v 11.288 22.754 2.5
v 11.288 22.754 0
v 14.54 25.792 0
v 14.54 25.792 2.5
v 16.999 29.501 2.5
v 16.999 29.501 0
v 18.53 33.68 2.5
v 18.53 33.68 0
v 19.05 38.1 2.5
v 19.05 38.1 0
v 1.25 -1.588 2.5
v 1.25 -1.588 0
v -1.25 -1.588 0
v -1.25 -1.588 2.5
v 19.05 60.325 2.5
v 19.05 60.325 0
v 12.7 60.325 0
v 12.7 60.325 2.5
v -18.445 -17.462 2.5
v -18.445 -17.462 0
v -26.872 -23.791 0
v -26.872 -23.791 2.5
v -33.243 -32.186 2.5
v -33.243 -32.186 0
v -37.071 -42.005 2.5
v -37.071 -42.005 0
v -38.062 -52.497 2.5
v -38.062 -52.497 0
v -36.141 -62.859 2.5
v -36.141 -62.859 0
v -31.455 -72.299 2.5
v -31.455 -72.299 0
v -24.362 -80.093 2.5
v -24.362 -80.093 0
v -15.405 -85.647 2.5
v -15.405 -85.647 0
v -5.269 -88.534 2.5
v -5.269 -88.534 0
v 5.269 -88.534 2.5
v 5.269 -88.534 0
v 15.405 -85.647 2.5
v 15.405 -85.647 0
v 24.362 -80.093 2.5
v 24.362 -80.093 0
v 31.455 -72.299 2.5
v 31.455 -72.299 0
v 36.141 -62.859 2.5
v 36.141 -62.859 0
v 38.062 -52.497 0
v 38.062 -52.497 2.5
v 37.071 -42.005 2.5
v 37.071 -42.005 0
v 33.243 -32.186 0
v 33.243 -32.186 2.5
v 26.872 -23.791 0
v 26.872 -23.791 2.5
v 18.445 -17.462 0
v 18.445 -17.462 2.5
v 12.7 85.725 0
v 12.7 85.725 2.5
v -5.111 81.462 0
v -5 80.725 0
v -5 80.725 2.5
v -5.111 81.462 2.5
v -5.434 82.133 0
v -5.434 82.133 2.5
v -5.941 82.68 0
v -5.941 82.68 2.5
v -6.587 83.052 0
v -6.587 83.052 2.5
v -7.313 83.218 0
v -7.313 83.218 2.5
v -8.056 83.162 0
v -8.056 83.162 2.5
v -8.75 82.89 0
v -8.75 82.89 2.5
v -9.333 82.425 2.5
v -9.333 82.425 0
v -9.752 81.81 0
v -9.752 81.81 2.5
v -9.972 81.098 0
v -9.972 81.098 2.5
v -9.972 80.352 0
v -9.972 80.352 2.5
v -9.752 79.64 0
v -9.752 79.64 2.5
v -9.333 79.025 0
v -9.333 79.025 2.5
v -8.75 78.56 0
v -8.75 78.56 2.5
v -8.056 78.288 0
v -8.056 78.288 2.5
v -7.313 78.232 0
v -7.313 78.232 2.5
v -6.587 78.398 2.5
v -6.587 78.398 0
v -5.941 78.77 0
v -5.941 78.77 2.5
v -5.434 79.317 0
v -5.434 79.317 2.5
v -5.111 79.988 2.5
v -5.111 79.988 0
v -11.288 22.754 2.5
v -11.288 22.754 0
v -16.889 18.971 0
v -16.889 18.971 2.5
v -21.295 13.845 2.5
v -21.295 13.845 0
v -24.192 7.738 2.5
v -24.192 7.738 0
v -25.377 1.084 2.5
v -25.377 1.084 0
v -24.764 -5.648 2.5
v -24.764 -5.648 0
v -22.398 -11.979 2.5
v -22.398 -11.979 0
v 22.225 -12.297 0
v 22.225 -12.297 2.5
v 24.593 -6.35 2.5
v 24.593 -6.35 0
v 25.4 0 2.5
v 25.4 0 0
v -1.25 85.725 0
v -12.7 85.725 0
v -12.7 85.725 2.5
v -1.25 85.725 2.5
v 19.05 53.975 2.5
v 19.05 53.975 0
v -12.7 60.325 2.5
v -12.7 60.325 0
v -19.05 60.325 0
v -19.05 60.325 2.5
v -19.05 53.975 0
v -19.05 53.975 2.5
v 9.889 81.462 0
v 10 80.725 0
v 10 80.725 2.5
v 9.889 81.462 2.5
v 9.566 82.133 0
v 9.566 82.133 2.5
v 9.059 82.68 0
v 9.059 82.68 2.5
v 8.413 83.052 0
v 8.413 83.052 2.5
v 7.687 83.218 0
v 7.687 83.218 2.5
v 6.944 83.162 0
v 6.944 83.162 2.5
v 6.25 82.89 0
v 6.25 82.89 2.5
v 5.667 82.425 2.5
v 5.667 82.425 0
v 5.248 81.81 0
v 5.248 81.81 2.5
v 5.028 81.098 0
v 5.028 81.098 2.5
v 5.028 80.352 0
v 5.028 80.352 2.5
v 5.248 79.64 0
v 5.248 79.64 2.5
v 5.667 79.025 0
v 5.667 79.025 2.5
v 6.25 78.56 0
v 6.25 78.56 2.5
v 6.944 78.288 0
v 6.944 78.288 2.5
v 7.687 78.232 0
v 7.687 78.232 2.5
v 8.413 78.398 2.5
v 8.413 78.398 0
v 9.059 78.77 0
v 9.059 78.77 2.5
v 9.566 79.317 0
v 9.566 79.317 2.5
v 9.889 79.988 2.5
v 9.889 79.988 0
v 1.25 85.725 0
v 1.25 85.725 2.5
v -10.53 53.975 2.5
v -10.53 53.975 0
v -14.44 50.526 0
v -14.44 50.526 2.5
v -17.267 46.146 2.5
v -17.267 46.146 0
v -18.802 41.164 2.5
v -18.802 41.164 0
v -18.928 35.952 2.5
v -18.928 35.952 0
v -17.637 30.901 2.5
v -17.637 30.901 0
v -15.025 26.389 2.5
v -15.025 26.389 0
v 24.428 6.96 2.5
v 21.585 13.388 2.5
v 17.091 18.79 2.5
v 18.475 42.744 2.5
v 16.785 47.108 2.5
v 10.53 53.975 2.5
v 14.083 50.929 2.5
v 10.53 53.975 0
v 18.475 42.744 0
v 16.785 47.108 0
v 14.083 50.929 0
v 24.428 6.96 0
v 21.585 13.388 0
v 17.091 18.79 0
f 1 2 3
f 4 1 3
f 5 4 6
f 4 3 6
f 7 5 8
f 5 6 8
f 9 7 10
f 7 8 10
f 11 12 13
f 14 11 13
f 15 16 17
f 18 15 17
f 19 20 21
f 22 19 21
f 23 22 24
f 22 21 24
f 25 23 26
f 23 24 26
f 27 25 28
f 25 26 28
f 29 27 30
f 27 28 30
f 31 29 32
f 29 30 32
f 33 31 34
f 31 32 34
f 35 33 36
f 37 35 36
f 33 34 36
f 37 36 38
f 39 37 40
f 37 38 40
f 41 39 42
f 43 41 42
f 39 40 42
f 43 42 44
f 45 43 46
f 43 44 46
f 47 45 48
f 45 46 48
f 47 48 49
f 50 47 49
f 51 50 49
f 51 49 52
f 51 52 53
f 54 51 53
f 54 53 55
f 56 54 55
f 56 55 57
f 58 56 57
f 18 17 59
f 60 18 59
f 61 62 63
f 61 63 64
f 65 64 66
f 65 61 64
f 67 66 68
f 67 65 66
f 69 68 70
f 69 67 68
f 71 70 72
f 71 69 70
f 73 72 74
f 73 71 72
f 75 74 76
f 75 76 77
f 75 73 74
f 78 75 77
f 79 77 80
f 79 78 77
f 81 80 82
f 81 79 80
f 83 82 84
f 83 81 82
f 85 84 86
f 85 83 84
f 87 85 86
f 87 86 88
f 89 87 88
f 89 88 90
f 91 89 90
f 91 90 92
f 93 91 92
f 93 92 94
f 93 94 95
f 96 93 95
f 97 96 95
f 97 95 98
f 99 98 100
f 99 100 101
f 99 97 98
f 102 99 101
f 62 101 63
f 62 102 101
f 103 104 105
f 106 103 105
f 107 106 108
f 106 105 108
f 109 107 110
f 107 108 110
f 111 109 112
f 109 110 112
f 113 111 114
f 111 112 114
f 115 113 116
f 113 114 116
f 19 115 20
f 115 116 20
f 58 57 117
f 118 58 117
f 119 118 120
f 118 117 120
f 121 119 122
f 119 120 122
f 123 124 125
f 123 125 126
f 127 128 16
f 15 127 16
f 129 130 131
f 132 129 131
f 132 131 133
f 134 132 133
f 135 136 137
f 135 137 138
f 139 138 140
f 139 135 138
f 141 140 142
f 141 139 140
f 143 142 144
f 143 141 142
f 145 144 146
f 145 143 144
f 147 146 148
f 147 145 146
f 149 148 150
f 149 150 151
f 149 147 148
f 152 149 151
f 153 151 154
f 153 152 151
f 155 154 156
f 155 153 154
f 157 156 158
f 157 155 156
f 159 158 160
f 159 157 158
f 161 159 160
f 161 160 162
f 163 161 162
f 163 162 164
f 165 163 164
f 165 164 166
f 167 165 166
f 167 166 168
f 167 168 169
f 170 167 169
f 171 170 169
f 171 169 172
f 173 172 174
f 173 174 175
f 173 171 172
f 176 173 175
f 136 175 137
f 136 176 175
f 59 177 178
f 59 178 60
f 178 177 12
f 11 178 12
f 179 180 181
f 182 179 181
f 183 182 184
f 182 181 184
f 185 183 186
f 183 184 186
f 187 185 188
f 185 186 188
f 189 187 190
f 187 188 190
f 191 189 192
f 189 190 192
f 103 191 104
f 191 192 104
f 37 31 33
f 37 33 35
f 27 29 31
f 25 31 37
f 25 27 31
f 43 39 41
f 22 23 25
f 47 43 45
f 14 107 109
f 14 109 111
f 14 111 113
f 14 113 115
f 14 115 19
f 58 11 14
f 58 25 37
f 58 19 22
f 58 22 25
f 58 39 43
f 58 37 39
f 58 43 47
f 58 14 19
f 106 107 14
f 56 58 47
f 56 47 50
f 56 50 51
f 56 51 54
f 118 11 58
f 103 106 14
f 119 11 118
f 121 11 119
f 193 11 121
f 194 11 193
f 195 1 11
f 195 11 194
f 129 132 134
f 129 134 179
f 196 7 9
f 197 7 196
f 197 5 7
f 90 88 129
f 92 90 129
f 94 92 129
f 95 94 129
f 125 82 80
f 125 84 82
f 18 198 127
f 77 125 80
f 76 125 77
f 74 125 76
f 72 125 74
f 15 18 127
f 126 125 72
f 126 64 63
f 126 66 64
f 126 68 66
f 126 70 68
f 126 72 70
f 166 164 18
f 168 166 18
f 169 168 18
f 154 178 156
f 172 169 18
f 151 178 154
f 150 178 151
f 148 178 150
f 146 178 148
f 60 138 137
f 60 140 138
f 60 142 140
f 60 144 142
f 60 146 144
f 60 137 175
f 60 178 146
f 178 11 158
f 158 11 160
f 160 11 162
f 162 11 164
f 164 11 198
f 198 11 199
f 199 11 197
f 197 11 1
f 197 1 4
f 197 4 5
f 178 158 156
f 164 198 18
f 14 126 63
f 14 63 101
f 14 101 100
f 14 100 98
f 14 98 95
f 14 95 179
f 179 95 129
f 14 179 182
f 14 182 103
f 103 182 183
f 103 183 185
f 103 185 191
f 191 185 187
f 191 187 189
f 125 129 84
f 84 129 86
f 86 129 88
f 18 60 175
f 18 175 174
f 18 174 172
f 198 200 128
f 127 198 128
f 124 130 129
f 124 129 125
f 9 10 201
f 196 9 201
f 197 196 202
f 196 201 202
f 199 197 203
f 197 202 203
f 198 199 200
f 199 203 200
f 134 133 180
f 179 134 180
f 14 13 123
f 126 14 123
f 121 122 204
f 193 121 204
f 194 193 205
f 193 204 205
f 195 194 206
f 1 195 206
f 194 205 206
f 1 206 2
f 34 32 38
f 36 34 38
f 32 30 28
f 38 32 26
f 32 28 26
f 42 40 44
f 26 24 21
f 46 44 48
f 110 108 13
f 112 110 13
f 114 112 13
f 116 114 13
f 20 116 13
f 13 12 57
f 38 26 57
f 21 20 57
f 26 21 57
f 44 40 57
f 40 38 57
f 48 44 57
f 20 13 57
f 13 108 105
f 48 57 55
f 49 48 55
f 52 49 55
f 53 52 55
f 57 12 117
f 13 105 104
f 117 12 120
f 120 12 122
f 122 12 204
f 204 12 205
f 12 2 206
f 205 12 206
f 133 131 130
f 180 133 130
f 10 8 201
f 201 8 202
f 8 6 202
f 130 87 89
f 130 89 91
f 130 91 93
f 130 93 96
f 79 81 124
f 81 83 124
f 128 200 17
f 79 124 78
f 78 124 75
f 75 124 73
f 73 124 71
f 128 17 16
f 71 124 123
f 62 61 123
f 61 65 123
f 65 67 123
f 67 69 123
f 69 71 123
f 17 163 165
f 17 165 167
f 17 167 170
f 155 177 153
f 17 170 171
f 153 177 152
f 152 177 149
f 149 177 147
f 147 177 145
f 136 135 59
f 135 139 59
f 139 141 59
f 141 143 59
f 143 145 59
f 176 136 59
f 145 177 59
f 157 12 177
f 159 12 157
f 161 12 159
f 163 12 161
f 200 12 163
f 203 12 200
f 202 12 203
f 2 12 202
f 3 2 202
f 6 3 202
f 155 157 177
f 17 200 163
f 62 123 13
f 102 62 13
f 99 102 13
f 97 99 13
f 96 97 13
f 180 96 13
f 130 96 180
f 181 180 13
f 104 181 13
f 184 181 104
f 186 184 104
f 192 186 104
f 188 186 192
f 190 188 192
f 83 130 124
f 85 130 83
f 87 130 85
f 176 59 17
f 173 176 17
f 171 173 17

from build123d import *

# Parameters (mm, degrees)
F0_W     = 11.45
F0_H     = 25.4
F0_R     = 2.5
F1_DEPTH = 2.5


# Not quite as in the source:
# - a feature names something its author has since deleted; it is built from what else it names


with BuildPart() as f1:
    # F0 (on Top) → F1 (new body)
    with BuildSketch(Plane.XY):
        with Locations((6.975, 73.025)):
            Rectangle(F0_W, F0_H)
        with Locations((7.5, 80.725)):
            Circle(F0_R, mode=Mode.SUBTRACT)
        with Locations((-6.975, 73.025)):
            Rectangle(F0_W, F0_H)
        with Locations((-7.5, 80.725)):
            Circle(F0_R, mode=Mode.SUBTRACT)
        with BuildLine():
            ThreePointArc((-10.5302837094, 53.975), (-6.0950122474, 56.1486377797), (-1.25, 57.1089452627))
            Line((-1.25, 57.1089452627), (-1.25, 60.325))
            Line((-1.25, 60.325), (-12.7, 60.325))
            Line((-12.7, 60.325), (-19.05, 60.325))
            Line((-19.05, 60.325), (-19.05, 53.975))
            Line((-19.05, 53.975), (-10.5302837094, 53.975))
        make_face()
        with BuildLine():
            ThreePointArc((1.25, 57.1089452627), (6.0950122474, 56.1486377797), (10.5302837094, 53.975))
            Line((10.5302837094, 53.975), (19.05, 53.975))
            Line((19.05, 53.975), (19.05, 60.325))
            Line((19.05, 60.325), (12.7, 60.325))
            Line((12.7, 60.325), (1.25, 60.325))
            Line((1.25, 60.325), (1.25, 57.1089452627))
        make_face()
        with BuildLine():
            Line((1.25, 53.975), (10.5302837094, 53.975))
            ThreePointArc((10.5302837094, 53.975), (6.0950122474, 56.1486377797), (1.25, 57.1089452627))
            Line((1.25, 57.1089452627), (1.25, 53.975))
        make_face()
        with BuildLine():
            Line((-1.25, 53.975), (-1.25, 57.1089452627))
            ThreePointArc((-1.25, 57.1089452627), (-6.0950122474, 56.1486377797), (-10.5302837094, 53.975))
            Line((-10.5302837094, 53.975), (-1.25, 53.975))
        make_face()
        with BuildLine():
            Line((-1.25, 25.3692234804), (-1.25, 53.975))
            Line((-1.25, 53.975), (-10.5302837094, 53.975))
            ThreePointArc((-10.5302837094, 53.975), (-19.0443993724, 38.5619010114), (-11.2875107666, 22.7541666667))
            ThreePointArc((-11.2875107666, 22.7541666667), (-6.4036649343, 24.5795255326), (-1.25, 25.3692234804))
        make_face()
        with BuildLine():
            ThreePointArc((11.2875107666, 22.7541666667), (16.9989643817, 29.5012960309), (19.05, 38.1))
            ThreePointArc((19.05, 38.1), (16.785475934, 47.1083460007), (10.5302837094, 53.975))
            Line((10.5302837094, 53.975), (1.25, 53.975))
            Line((1.25, 53.975), (1.25, 25.3692234804))
            ThreePointArc((1.25, 25.3692234804), (6.4036649343, 24.5795255326), (11.2875107666, 22.7541666667))
        make_face()
        with BuildLine():
            ThreePointArc((-11.2875107666, 22.7541666667), (-6.5308415466, 20.204452825), (-1.25, 19.0910547373))
            Line((-1.25, 19.0910547373), (-1.25, 25.3692234804))
            ThreePointArc((-1.25, 25.3692234804), (-6.4036649343, 24.5795255326), (-11.2875107666, 22.7541666667))
        make_face()
        with BuildLine():
            ThreePointArc((1.25, 19.0910547373), (6.5308415466, 20.204452825), (11.2875107666, 22.7541666667))
            ThreePointArc((11.2875107666, 22.7541666667), (6.4036649343, 24.5795255326), (1.25, 25.3692234804))
            Line((1.25, 25.3692234804), (1.25, 19.0910547373))
        make_face()
        with BuildLine():
            ThreePointArc((-18.4450831863, -17.4625), (0, -25.4), (18.4450831863, -17.4625))
            ThreePointArc((18.4450831863, -17.4625), (0, -12.7), (-18.4450831863, -17.4625))
        make_face()
        with BuildLine():
            ThreePointArc((38.1, -50.8), (32.820478892, -31.4499052896), (18.4450831863, -17.4625))
            ThreePointArc((18.4450831863, -17.4625), (0, -25.4), (-18.4450831863, -17.4625))
            ThreePointArc((-18.4450831863, -17.4625), (-19.3500947104, -83.620478892), (38.1, -50.8))
        make_face()
        with BuildLine():
            ThreePointArc((25.4, 0), (21.5854438624, 13.3876291129), (11.2875107666, 22.7541666667))
            ThreePointArc((11.2875107666, 22.7541666667), (6.5308415466, 20.204452825), (1.25, 19.0910547373))
            Line((1.25, 19.0910547373), (1.25, -1.5875))
            Line((1.25, -1.5875), (-1.25, -1.5875))
            Line((-1.25, -1.5875), (-1.25, 19.0910547373))
            ThreePointArc((-1.25, 19.0910547373), (-6.5308415466, 20.204452825), (-11.2875107666, 22.7541666667))
            ThreePointArc((-11.2875107666, 22.7541666667), (-25.0070361146, 4.4506341979), (-18.4450831863, -17.4625))
            ThreePointArc((-18.4450831863, -17.4625), (0, -12.7), (18.4450831863, -17.4625))
            ThreePointArc((18.4450831863, -17.4625), (23.5972997707, -9.3982681135), (25.4, 0))
        make_face()
    extrude(amount=F1_DEPTH)


solid = f1.part
